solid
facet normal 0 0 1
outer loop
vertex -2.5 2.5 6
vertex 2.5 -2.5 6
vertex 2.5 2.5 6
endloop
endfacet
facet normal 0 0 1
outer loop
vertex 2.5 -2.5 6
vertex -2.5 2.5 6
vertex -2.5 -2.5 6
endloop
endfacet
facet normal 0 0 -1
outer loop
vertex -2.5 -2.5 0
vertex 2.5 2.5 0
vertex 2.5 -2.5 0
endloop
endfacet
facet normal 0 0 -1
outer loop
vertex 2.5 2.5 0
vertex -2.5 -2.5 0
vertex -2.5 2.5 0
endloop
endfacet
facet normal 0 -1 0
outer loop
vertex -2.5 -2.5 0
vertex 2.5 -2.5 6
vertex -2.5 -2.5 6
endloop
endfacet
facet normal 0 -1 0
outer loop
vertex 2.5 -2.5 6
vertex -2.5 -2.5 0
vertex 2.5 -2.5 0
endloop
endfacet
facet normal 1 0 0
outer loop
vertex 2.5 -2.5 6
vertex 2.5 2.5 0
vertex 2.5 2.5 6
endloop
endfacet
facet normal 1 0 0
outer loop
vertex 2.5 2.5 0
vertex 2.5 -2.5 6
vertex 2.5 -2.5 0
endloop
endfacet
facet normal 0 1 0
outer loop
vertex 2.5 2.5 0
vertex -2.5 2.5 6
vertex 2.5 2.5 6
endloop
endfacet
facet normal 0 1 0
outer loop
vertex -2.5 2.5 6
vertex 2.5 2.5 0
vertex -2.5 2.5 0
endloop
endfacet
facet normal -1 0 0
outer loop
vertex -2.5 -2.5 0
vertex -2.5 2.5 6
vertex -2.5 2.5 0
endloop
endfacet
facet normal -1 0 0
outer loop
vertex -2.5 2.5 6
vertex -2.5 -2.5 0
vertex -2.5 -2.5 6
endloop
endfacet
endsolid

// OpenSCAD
// brick 1x1

// external vars

ext_scale = 1.0;

// part

scale([ext_scale,ext_scale,ext_scale])
translate([-2.5,-2.5,0])
cube([5,5,6],center=false);
